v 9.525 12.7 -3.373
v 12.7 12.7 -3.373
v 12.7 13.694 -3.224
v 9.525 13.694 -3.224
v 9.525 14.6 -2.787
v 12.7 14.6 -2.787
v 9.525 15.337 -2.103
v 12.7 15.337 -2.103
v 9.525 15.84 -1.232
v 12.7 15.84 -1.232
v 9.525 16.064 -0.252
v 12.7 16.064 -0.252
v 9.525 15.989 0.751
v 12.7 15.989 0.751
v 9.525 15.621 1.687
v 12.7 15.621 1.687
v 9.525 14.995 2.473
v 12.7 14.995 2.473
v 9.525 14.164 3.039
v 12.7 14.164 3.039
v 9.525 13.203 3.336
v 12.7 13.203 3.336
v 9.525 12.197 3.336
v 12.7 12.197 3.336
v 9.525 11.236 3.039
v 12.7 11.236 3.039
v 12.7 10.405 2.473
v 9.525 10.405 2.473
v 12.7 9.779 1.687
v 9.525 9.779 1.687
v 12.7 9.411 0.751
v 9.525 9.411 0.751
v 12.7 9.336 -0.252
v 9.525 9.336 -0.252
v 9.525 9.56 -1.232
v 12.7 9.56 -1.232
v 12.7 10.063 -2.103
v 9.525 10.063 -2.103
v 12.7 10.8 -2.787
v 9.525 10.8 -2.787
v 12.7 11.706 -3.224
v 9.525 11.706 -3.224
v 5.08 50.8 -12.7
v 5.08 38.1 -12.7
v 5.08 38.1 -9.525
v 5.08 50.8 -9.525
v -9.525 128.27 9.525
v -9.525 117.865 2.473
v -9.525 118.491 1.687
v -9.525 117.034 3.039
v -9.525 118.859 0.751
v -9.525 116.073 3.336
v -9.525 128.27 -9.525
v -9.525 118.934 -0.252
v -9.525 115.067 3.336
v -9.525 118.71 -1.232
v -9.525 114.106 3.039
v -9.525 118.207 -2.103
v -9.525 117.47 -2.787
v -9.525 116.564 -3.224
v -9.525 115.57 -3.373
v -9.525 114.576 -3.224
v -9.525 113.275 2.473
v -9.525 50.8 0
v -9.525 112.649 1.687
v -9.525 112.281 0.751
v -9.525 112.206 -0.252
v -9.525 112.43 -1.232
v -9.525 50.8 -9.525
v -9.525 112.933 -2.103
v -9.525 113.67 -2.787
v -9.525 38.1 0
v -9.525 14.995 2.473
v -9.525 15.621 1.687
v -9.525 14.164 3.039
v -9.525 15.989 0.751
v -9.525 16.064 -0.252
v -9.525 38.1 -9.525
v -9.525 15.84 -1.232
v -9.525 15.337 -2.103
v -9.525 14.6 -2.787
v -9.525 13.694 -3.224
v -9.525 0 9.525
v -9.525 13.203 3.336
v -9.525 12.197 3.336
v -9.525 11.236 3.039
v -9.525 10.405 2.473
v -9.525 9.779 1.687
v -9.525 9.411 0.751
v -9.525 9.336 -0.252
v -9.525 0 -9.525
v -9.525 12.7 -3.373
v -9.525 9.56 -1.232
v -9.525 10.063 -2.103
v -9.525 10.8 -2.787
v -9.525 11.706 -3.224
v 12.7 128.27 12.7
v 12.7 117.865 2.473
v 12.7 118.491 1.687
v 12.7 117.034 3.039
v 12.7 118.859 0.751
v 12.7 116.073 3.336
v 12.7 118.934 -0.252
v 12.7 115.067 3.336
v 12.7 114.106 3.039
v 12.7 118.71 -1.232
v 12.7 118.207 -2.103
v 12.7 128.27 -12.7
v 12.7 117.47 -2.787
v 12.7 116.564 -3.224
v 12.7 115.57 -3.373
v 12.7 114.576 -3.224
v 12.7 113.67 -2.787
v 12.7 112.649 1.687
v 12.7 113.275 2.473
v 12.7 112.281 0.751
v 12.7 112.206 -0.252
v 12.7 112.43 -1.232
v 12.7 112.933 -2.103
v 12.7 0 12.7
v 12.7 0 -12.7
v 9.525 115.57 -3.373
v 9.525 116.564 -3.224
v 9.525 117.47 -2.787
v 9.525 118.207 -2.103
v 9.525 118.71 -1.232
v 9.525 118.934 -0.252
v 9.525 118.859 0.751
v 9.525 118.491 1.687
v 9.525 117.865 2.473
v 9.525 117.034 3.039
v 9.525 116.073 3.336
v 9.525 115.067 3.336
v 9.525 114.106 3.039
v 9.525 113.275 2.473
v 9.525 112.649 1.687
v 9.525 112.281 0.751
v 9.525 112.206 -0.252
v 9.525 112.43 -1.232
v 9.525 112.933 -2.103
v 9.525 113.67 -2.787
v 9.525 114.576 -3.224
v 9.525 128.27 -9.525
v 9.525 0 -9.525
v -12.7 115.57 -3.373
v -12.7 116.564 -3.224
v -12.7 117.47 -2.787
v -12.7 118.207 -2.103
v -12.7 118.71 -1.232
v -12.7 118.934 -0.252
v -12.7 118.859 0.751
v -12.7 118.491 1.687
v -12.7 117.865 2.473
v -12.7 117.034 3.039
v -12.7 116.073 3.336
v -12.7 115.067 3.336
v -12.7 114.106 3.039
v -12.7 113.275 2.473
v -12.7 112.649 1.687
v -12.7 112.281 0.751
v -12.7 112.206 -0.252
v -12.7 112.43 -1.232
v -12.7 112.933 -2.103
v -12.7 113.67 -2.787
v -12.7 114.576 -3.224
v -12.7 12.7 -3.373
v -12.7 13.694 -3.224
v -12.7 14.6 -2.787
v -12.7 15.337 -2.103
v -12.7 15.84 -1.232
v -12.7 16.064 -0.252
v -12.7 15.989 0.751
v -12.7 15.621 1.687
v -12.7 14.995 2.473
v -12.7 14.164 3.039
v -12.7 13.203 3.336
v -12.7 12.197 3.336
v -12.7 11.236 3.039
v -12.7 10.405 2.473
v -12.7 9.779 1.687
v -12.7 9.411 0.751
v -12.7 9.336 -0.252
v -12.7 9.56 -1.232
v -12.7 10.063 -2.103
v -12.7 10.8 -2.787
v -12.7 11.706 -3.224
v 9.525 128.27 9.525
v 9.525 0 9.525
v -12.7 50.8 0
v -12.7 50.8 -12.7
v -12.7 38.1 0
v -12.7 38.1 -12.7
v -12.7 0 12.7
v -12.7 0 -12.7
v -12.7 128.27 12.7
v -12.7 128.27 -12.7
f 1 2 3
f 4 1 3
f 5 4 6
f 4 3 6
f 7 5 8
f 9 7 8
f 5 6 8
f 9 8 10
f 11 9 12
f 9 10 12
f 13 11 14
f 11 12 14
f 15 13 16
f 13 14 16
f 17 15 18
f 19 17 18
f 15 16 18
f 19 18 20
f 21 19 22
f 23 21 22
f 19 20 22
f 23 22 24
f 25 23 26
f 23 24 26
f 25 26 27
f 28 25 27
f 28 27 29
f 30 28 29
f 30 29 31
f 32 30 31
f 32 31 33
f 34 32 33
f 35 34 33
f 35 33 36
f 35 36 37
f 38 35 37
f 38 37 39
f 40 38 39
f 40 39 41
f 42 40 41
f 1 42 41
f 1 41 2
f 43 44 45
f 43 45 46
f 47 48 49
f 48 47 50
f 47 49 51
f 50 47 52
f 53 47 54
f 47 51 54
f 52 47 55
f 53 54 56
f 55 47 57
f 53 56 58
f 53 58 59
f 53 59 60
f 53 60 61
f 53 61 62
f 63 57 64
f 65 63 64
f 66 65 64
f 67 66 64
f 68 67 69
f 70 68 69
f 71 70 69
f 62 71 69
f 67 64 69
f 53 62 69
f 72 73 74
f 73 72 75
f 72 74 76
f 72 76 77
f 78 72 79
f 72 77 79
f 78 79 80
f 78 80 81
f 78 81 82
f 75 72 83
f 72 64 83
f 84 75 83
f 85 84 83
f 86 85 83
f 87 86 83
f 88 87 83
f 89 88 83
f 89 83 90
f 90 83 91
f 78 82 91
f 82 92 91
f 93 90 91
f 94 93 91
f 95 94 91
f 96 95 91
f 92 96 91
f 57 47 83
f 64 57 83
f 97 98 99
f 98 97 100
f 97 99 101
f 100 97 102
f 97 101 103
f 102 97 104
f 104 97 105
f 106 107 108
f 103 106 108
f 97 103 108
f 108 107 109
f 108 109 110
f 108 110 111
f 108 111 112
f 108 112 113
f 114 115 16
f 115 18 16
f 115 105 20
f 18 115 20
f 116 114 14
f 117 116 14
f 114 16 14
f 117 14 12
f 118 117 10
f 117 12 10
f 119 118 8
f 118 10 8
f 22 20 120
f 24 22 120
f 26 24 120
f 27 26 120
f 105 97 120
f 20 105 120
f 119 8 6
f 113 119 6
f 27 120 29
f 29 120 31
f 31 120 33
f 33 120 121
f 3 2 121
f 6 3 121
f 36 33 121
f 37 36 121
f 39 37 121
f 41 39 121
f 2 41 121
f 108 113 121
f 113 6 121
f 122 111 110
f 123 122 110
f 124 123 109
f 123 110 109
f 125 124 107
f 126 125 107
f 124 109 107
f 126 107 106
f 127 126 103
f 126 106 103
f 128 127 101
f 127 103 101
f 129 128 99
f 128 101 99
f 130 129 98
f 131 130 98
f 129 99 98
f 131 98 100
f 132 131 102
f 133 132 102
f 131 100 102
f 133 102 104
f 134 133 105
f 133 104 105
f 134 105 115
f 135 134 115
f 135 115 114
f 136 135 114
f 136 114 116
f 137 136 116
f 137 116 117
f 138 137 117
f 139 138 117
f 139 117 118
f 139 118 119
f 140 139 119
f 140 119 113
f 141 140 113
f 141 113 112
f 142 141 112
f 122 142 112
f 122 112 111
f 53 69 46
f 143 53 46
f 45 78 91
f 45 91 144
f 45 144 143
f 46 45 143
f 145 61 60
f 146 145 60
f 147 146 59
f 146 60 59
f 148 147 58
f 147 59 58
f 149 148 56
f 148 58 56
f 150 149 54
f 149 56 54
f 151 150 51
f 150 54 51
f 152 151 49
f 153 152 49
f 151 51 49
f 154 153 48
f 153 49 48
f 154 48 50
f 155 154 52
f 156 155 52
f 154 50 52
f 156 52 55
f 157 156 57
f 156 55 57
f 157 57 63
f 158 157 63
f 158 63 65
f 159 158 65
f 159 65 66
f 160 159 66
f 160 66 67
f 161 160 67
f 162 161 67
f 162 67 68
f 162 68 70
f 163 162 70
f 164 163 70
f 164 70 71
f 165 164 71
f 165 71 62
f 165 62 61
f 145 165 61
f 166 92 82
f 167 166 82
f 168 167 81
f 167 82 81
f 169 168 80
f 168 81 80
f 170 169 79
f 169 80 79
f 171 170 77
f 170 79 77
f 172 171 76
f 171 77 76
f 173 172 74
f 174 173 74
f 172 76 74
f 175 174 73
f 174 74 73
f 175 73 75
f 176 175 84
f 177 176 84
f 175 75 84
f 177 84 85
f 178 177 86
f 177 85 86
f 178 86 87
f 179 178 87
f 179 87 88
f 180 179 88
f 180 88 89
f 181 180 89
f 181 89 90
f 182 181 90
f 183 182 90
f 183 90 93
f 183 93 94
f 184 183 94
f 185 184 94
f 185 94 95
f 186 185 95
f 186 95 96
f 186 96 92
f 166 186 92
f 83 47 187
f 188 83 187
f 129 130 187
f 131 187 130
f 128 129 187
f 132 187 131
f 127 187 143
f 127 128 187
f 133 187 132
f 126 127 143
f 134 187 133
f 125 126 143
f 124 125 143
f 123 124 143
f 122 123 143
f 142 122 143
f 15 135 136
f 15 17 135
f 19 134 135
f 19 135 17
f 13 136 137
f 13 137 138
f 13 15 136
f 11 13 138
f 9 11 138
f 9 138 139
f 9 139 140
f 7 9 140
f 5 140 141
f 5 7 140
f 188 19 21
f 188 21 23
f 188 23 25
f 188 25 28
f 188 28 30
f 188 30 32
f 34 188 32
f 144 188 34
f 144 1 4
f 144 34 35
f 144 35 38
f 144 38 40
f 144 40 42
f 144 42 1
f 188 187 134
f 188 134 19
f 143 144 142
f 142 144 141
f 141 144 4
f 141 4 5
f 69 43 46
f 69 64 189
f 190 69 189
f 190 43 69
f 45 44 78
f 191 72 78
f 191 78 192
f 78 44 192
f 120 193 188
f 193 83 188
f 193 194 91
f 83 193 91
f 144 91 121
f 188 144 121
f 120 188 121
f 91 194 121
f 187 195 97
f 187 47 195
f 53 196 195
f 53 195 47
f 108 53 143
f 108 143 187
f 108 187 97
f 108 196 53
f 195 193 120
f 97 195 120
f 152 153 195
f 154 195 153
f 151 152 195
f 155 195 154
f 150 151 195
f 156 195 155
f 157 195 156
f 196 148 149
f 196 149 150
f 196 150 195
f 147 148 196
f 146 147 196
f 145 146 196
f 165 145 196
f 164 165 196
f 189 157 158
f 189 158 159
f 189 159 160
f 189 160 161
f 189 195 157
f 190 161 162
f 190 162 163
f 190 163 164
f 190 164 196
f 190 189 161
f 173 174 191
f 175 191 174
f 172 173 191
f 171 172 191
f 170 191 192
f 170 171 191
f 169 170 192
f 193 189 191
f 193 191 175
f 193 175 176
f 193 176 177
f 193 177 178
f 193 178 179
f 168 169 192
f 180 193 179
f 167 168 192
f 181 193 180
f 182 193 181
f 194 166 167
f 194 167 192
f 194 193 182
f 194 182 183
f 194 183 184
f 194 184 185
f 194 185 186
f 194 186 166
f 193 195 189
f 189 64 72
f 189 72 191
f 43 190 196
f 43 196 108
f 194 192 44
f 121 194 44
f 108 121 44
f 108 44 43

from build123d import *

# Parameters (mm, degrees)
SKETCH1_W           = 25.4
SKETCH1_H           = 25.4
SKETCH1_W_2         = 19.05
SKETCH1_H_2         = 19.05
BOSS_EXTRUDE1_DEPTH = 128.27
SKETCH2_W           = 46.765463489
SKETCH2_H           = 12.7
CUT_EXTRUDE1_DEPTH  = 12.7
SKETCH4_R           = 3.3734375
CUT_EXTRUDE2_DEPTH  = 132.37596013


with BuildPart() as part:
    # Sketch1 → Boss-Extrude1 (new body)
    with BuildSketch(Plane(origin=(0, 0, 0), x_dir=(1, 0, 0), z_dir=(0, 1, 0))):
        Rectangle(SKETCH1_W, SKETCH1_H)
        Rectangle(SKETCH1_W_2, SKETCH1_H_2, mode=Mode.SUBTRACT)
    extrude(amount=BOSS_EXTRUDE1_DEPTH)

    # Sketch2 → Cut-Extrude1 (cut)
    with BuildSketch(Plane(origin=(0, 0, -12.7), x_dir=(-1, 0, 0), z_dir=(0, 0, -1))):
        with Locations((18.302731745, 44.45)):
            Rectangle(SKETCH2_W, SKETCH2_H)
    extrude(amount=-CUT_EXTRUDE1_DEPTH, mode=Mode.SUBTRACT)

    # Sketch4 → Cut-Extrude2 (cut, through all)
    with BuildSketch(Plane(origin=(12.7, 0, 0), x_dir=(0, 0, -1), z_dir=(1, 0, 0))):
        with Locations((0, 115.57)):
            Circle(SKETCH4_R)
        with Locations((0, 12.7)):
            Circle(SKETCH4_R)
    extrude(amount=-CUT_EXTRUDE2_DEPTH, mode=Mode.SUBTRACT)


solid = part.part
